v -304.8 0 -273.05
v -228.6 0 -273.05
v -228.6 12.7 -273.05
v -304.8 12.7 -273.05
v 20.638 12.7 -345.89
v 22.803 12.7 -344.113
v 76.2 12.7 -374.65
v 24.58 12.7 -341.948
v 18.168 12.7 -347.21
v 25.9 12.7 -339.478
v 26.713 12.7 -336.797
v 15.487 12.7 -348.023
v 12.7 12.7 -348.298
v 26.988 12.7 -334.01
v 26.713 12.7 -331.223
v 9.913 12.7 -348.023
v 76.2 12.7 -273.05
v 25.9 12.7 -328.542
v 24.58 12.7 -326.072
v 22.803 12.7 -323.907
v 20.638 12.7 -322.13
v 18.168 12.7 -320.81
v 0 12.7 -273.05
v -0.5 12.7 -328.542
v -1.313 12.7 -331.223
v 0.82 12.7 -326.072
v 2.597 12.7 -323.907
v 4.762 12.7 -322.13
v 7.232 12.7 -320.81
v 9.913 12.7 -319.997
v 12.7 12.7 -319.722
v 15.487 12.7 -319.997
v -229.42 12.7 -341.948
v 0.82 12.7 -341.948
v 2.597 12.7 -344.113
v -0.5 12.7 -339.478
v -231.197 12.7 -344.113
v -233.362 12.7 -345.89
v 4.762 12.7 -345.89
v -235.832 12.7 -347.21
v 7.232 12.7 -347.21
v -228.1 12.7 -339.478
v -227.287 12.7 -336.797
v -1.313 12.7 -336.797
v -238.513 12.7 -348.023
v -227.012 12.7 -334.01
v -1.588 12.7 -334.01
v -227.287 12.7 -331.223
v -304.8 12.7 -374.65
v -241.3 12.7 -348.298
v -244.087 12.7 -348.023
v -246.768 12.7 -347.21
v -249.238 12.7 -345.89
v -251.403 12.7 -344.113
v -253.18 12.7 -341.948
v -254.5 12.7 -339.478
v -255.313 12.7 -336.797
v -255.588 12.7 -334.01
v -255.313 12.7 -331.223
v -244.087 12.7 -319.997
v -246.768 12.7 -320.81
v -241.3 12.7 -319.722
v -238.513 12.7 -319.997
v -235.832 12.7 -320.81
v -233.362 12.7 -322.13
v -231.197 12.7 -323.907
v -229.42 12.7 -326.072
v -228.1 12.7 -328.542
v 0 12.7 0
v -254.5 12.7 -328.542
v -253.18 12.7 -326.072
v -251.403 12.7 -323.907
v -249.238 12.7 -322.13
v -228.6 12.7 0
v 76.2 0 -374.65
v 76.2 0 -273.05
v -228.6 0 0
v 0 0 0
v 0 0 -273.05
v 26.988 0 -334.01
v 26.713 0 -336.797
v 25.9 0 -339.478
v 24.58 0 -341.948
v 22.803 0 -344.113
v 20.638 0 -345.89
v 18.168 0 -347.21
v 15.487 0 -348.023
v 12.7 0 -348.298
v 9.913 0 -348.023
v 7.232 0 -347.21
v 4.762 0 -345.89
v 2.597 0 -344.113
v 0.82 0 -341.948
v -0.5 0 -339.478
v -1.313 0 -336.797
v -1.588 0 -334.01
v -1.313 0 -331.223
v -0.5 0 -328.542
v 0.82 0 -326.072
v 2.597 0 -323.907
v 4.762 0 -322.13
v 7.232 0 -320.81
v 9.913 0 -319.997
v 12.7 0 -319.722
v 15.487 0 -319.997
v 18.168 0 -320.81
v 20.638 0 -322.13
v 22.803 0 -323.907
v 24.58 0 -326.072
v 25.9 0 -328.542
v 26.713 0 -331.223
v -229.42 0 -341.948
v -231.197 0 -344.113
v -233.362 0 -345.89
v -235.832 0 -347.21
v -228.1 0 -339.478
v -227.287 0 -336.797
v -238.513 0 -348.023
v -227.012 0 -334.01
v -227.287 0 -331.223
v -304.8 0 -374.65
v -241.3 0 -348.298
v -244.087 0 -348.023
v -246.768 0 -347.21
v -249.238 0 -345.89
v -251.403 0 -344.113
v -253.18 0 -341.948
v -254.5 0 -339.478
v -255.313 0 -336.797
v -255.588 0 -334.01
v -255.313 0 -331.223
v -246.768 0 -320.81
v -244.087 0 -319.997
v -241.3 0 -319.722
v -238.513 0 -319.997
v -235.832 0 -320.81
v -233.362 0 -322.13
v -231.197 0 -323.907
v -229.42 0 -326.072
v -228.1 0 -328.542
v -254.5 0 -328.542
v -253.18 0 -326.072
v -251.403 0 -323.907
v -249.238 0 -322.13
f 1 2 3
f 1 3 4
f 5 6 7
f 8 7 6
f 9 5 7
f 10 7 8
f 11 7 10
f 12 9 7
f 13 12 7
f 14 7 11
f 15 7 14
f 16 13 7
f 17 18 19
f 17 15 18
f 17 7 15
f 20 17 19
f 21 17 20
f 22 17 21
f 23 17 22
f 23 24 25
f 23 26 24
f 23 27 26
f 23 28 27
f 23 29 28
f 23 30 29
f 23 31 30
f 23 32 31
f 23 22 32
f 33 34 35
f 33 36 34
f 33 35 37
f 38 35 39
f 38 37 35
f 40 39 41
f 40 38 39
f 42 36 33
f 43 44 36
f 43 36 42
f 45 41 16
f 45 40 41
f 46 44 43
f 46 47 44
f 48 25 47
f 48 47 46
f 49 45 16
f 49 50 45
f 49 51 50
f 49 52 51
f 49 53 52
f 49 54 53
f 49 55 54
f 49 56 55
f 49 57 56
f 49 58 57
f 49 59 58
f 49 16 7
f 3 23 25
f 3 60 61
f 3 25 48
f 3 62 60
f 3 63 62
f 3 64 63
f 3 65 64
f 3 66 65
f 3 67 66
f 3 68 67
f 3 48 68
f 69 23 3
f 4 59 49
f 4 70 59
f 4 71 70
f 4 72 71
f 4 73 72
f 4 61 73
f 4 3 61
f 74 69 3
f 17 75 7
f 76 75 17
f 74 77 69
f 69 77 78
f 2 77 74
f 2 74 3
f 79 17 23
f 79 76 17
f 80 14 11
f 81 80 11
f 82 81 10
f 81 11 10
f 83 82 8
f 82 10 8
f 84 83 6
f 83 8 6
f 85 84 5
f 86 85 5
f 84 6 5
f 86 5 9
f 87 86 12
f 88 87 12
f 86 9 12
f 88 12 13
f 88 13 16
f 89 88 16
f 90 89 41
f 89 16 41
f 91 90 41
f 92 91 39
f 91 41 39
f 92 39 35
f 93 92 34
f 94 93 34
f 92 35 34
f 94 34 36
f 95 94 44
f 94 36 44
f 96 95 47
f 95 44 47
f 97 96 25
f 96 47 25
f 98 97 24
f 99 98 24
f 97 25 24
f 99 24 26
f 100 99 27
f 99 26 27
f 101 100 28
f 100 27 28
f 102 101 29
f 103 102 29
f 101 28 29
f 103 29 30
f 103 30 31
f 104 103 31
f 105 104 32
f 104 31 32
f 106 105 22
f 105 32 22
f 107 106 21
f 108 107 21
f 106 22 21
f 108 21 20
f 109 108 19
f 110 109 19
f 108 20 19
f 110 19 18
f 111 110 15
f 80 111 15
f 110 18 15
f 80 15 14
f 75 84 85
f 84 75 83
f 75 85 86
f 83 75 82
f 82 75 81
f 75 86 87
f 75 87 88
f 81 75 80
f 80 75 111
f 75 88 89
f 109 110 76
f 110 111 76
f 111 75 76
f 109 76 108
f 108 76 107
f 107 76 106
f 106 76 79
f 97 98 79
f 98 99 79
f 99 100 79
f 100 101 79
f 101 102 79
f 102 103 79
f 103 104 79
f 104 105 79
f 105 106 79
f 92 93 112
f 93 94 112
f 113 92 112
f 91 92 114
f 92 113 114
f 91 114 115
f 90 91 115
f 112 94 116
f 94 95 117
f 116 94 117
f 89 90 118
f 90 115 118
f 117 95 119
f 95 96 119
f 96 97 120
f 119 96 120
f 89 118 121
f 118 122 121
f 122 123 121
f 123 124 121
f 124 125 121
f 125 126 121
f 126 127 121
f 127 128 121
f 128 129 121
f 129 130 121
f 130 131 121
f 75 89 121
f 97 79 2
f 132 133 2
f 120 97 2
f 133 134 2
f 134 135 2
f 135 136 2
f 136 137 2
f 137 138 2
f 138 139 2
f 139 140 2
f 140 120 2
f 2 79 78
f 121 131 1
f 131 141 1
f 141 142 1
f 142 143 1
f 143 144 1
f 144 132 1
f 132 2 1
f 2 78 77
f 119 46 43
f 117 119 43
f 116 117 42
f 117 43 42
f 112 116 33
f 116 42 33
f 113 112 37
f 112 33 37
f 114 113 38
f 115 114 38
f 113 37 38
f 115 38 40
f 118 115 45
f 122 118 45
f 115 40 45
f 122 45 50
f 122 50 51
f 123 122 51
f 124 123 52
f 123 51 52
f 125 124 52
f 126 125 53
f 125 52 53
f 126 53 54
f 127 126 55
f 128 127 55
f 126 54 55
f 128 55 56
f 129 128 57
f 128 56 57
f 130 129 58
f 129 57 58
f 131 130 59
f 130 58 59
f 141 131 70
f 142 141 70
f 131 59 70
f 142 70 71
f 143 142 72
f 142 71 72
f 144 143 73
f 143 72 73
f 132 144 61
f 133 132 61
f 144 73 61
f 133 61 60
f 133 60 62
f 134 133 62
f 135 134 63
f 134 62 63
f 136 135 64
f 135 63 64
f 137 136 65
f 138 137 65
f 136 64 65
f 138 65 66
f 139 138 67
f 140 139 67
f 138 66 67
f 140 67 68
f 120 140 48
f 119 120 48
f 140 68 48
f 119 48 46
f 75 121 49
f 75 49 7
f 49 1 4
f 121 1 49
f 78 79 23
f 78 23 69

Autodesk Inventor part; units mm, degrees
ref_plane "YZ Plane" through (0, 0, 0) normal (1, 0, 0) x (0, 1, 0)
ref_plane "XZ Plane" through (0, 0, 0) normal (0, 1, 0) x (-1, 0, 0)
ref_plane "XY Plane" through (0, 0, 0) normal (0, 0, 1) x (1, 0, 0)
sketch "Sketch1" plane through (0, 0, 0) normal (0, 1, 0) x (-1, 0, 0)
  line L0 (228.6, 0) -> (228.6, -273.05)
  line L1 (0, -273.05) -> (0, 0)
  line L2 (0, 0) -> (-76.2, 0)
  line L3 (0, 0) -> (-76.2, 0)
  line L4 (228.6, 0) -> (0, 0)
  line L5 (228.6, -273.05) -> (304.8, -273.05)
  line L6 (304.8, -273.05) -> (304.8, -374.65)
  line L7 (304.8, -374.65) -> (-76.2, -374.65)
  line L8 (-76.2, -374.65) -> (-76.2, -273.05)
  line L9 (-76.2, -273.05) -> (0, -273.05)
  line L10 (114.3, -511.2369) -> (114.3, 135.5146) construction
  point P0 (304.8, 0)
  dimension "d1" = 273.05
  dimension "d8" = 228.6
  dimension "d9" = 76.2
  dimension "d10" = 76.2
  dimension "d11" = 101.6
extrude "Extrusion1" add sketch "Sketch1" along normal blind 12.7
sketch "Sketch2" plane through (0, 12.7, 0) normal (0, 1, 0) x (1, 0, 0)
  point P0 (0, 0)
sketch "Sketch3" plane through (0, 12.7, 0) normal (0, 1, 0) x (1, 0, 0)
  line L0 (-114.3, 418.531) -> (-114.3, -18.8119) construction
  circle A0 centre (-241.3, 334.01) radius 14.2875
  line L1 (-304.8, 273.05) -> (-228.6, 273.05) construction
  line L2 (0, 273.05) -> (76.2, 273.05) construction
  circle A1 centre (12.7, 334.01) radius 14.2875
  point P0 (0, 0)
  dimension "d19" = 114.3
  dimension "d20" = 28.575
  dimension "d23" = 60.96
  dimension "d26" = 127
  dimension "d27" = 28.575
  dimension "d28" = 60.96
  dimension "d29" = 127
extrude "Extrusion2" cut sketch "Sketch3" against normal through all
properties part number "shooter bottom" material "Wood (Oak)"
